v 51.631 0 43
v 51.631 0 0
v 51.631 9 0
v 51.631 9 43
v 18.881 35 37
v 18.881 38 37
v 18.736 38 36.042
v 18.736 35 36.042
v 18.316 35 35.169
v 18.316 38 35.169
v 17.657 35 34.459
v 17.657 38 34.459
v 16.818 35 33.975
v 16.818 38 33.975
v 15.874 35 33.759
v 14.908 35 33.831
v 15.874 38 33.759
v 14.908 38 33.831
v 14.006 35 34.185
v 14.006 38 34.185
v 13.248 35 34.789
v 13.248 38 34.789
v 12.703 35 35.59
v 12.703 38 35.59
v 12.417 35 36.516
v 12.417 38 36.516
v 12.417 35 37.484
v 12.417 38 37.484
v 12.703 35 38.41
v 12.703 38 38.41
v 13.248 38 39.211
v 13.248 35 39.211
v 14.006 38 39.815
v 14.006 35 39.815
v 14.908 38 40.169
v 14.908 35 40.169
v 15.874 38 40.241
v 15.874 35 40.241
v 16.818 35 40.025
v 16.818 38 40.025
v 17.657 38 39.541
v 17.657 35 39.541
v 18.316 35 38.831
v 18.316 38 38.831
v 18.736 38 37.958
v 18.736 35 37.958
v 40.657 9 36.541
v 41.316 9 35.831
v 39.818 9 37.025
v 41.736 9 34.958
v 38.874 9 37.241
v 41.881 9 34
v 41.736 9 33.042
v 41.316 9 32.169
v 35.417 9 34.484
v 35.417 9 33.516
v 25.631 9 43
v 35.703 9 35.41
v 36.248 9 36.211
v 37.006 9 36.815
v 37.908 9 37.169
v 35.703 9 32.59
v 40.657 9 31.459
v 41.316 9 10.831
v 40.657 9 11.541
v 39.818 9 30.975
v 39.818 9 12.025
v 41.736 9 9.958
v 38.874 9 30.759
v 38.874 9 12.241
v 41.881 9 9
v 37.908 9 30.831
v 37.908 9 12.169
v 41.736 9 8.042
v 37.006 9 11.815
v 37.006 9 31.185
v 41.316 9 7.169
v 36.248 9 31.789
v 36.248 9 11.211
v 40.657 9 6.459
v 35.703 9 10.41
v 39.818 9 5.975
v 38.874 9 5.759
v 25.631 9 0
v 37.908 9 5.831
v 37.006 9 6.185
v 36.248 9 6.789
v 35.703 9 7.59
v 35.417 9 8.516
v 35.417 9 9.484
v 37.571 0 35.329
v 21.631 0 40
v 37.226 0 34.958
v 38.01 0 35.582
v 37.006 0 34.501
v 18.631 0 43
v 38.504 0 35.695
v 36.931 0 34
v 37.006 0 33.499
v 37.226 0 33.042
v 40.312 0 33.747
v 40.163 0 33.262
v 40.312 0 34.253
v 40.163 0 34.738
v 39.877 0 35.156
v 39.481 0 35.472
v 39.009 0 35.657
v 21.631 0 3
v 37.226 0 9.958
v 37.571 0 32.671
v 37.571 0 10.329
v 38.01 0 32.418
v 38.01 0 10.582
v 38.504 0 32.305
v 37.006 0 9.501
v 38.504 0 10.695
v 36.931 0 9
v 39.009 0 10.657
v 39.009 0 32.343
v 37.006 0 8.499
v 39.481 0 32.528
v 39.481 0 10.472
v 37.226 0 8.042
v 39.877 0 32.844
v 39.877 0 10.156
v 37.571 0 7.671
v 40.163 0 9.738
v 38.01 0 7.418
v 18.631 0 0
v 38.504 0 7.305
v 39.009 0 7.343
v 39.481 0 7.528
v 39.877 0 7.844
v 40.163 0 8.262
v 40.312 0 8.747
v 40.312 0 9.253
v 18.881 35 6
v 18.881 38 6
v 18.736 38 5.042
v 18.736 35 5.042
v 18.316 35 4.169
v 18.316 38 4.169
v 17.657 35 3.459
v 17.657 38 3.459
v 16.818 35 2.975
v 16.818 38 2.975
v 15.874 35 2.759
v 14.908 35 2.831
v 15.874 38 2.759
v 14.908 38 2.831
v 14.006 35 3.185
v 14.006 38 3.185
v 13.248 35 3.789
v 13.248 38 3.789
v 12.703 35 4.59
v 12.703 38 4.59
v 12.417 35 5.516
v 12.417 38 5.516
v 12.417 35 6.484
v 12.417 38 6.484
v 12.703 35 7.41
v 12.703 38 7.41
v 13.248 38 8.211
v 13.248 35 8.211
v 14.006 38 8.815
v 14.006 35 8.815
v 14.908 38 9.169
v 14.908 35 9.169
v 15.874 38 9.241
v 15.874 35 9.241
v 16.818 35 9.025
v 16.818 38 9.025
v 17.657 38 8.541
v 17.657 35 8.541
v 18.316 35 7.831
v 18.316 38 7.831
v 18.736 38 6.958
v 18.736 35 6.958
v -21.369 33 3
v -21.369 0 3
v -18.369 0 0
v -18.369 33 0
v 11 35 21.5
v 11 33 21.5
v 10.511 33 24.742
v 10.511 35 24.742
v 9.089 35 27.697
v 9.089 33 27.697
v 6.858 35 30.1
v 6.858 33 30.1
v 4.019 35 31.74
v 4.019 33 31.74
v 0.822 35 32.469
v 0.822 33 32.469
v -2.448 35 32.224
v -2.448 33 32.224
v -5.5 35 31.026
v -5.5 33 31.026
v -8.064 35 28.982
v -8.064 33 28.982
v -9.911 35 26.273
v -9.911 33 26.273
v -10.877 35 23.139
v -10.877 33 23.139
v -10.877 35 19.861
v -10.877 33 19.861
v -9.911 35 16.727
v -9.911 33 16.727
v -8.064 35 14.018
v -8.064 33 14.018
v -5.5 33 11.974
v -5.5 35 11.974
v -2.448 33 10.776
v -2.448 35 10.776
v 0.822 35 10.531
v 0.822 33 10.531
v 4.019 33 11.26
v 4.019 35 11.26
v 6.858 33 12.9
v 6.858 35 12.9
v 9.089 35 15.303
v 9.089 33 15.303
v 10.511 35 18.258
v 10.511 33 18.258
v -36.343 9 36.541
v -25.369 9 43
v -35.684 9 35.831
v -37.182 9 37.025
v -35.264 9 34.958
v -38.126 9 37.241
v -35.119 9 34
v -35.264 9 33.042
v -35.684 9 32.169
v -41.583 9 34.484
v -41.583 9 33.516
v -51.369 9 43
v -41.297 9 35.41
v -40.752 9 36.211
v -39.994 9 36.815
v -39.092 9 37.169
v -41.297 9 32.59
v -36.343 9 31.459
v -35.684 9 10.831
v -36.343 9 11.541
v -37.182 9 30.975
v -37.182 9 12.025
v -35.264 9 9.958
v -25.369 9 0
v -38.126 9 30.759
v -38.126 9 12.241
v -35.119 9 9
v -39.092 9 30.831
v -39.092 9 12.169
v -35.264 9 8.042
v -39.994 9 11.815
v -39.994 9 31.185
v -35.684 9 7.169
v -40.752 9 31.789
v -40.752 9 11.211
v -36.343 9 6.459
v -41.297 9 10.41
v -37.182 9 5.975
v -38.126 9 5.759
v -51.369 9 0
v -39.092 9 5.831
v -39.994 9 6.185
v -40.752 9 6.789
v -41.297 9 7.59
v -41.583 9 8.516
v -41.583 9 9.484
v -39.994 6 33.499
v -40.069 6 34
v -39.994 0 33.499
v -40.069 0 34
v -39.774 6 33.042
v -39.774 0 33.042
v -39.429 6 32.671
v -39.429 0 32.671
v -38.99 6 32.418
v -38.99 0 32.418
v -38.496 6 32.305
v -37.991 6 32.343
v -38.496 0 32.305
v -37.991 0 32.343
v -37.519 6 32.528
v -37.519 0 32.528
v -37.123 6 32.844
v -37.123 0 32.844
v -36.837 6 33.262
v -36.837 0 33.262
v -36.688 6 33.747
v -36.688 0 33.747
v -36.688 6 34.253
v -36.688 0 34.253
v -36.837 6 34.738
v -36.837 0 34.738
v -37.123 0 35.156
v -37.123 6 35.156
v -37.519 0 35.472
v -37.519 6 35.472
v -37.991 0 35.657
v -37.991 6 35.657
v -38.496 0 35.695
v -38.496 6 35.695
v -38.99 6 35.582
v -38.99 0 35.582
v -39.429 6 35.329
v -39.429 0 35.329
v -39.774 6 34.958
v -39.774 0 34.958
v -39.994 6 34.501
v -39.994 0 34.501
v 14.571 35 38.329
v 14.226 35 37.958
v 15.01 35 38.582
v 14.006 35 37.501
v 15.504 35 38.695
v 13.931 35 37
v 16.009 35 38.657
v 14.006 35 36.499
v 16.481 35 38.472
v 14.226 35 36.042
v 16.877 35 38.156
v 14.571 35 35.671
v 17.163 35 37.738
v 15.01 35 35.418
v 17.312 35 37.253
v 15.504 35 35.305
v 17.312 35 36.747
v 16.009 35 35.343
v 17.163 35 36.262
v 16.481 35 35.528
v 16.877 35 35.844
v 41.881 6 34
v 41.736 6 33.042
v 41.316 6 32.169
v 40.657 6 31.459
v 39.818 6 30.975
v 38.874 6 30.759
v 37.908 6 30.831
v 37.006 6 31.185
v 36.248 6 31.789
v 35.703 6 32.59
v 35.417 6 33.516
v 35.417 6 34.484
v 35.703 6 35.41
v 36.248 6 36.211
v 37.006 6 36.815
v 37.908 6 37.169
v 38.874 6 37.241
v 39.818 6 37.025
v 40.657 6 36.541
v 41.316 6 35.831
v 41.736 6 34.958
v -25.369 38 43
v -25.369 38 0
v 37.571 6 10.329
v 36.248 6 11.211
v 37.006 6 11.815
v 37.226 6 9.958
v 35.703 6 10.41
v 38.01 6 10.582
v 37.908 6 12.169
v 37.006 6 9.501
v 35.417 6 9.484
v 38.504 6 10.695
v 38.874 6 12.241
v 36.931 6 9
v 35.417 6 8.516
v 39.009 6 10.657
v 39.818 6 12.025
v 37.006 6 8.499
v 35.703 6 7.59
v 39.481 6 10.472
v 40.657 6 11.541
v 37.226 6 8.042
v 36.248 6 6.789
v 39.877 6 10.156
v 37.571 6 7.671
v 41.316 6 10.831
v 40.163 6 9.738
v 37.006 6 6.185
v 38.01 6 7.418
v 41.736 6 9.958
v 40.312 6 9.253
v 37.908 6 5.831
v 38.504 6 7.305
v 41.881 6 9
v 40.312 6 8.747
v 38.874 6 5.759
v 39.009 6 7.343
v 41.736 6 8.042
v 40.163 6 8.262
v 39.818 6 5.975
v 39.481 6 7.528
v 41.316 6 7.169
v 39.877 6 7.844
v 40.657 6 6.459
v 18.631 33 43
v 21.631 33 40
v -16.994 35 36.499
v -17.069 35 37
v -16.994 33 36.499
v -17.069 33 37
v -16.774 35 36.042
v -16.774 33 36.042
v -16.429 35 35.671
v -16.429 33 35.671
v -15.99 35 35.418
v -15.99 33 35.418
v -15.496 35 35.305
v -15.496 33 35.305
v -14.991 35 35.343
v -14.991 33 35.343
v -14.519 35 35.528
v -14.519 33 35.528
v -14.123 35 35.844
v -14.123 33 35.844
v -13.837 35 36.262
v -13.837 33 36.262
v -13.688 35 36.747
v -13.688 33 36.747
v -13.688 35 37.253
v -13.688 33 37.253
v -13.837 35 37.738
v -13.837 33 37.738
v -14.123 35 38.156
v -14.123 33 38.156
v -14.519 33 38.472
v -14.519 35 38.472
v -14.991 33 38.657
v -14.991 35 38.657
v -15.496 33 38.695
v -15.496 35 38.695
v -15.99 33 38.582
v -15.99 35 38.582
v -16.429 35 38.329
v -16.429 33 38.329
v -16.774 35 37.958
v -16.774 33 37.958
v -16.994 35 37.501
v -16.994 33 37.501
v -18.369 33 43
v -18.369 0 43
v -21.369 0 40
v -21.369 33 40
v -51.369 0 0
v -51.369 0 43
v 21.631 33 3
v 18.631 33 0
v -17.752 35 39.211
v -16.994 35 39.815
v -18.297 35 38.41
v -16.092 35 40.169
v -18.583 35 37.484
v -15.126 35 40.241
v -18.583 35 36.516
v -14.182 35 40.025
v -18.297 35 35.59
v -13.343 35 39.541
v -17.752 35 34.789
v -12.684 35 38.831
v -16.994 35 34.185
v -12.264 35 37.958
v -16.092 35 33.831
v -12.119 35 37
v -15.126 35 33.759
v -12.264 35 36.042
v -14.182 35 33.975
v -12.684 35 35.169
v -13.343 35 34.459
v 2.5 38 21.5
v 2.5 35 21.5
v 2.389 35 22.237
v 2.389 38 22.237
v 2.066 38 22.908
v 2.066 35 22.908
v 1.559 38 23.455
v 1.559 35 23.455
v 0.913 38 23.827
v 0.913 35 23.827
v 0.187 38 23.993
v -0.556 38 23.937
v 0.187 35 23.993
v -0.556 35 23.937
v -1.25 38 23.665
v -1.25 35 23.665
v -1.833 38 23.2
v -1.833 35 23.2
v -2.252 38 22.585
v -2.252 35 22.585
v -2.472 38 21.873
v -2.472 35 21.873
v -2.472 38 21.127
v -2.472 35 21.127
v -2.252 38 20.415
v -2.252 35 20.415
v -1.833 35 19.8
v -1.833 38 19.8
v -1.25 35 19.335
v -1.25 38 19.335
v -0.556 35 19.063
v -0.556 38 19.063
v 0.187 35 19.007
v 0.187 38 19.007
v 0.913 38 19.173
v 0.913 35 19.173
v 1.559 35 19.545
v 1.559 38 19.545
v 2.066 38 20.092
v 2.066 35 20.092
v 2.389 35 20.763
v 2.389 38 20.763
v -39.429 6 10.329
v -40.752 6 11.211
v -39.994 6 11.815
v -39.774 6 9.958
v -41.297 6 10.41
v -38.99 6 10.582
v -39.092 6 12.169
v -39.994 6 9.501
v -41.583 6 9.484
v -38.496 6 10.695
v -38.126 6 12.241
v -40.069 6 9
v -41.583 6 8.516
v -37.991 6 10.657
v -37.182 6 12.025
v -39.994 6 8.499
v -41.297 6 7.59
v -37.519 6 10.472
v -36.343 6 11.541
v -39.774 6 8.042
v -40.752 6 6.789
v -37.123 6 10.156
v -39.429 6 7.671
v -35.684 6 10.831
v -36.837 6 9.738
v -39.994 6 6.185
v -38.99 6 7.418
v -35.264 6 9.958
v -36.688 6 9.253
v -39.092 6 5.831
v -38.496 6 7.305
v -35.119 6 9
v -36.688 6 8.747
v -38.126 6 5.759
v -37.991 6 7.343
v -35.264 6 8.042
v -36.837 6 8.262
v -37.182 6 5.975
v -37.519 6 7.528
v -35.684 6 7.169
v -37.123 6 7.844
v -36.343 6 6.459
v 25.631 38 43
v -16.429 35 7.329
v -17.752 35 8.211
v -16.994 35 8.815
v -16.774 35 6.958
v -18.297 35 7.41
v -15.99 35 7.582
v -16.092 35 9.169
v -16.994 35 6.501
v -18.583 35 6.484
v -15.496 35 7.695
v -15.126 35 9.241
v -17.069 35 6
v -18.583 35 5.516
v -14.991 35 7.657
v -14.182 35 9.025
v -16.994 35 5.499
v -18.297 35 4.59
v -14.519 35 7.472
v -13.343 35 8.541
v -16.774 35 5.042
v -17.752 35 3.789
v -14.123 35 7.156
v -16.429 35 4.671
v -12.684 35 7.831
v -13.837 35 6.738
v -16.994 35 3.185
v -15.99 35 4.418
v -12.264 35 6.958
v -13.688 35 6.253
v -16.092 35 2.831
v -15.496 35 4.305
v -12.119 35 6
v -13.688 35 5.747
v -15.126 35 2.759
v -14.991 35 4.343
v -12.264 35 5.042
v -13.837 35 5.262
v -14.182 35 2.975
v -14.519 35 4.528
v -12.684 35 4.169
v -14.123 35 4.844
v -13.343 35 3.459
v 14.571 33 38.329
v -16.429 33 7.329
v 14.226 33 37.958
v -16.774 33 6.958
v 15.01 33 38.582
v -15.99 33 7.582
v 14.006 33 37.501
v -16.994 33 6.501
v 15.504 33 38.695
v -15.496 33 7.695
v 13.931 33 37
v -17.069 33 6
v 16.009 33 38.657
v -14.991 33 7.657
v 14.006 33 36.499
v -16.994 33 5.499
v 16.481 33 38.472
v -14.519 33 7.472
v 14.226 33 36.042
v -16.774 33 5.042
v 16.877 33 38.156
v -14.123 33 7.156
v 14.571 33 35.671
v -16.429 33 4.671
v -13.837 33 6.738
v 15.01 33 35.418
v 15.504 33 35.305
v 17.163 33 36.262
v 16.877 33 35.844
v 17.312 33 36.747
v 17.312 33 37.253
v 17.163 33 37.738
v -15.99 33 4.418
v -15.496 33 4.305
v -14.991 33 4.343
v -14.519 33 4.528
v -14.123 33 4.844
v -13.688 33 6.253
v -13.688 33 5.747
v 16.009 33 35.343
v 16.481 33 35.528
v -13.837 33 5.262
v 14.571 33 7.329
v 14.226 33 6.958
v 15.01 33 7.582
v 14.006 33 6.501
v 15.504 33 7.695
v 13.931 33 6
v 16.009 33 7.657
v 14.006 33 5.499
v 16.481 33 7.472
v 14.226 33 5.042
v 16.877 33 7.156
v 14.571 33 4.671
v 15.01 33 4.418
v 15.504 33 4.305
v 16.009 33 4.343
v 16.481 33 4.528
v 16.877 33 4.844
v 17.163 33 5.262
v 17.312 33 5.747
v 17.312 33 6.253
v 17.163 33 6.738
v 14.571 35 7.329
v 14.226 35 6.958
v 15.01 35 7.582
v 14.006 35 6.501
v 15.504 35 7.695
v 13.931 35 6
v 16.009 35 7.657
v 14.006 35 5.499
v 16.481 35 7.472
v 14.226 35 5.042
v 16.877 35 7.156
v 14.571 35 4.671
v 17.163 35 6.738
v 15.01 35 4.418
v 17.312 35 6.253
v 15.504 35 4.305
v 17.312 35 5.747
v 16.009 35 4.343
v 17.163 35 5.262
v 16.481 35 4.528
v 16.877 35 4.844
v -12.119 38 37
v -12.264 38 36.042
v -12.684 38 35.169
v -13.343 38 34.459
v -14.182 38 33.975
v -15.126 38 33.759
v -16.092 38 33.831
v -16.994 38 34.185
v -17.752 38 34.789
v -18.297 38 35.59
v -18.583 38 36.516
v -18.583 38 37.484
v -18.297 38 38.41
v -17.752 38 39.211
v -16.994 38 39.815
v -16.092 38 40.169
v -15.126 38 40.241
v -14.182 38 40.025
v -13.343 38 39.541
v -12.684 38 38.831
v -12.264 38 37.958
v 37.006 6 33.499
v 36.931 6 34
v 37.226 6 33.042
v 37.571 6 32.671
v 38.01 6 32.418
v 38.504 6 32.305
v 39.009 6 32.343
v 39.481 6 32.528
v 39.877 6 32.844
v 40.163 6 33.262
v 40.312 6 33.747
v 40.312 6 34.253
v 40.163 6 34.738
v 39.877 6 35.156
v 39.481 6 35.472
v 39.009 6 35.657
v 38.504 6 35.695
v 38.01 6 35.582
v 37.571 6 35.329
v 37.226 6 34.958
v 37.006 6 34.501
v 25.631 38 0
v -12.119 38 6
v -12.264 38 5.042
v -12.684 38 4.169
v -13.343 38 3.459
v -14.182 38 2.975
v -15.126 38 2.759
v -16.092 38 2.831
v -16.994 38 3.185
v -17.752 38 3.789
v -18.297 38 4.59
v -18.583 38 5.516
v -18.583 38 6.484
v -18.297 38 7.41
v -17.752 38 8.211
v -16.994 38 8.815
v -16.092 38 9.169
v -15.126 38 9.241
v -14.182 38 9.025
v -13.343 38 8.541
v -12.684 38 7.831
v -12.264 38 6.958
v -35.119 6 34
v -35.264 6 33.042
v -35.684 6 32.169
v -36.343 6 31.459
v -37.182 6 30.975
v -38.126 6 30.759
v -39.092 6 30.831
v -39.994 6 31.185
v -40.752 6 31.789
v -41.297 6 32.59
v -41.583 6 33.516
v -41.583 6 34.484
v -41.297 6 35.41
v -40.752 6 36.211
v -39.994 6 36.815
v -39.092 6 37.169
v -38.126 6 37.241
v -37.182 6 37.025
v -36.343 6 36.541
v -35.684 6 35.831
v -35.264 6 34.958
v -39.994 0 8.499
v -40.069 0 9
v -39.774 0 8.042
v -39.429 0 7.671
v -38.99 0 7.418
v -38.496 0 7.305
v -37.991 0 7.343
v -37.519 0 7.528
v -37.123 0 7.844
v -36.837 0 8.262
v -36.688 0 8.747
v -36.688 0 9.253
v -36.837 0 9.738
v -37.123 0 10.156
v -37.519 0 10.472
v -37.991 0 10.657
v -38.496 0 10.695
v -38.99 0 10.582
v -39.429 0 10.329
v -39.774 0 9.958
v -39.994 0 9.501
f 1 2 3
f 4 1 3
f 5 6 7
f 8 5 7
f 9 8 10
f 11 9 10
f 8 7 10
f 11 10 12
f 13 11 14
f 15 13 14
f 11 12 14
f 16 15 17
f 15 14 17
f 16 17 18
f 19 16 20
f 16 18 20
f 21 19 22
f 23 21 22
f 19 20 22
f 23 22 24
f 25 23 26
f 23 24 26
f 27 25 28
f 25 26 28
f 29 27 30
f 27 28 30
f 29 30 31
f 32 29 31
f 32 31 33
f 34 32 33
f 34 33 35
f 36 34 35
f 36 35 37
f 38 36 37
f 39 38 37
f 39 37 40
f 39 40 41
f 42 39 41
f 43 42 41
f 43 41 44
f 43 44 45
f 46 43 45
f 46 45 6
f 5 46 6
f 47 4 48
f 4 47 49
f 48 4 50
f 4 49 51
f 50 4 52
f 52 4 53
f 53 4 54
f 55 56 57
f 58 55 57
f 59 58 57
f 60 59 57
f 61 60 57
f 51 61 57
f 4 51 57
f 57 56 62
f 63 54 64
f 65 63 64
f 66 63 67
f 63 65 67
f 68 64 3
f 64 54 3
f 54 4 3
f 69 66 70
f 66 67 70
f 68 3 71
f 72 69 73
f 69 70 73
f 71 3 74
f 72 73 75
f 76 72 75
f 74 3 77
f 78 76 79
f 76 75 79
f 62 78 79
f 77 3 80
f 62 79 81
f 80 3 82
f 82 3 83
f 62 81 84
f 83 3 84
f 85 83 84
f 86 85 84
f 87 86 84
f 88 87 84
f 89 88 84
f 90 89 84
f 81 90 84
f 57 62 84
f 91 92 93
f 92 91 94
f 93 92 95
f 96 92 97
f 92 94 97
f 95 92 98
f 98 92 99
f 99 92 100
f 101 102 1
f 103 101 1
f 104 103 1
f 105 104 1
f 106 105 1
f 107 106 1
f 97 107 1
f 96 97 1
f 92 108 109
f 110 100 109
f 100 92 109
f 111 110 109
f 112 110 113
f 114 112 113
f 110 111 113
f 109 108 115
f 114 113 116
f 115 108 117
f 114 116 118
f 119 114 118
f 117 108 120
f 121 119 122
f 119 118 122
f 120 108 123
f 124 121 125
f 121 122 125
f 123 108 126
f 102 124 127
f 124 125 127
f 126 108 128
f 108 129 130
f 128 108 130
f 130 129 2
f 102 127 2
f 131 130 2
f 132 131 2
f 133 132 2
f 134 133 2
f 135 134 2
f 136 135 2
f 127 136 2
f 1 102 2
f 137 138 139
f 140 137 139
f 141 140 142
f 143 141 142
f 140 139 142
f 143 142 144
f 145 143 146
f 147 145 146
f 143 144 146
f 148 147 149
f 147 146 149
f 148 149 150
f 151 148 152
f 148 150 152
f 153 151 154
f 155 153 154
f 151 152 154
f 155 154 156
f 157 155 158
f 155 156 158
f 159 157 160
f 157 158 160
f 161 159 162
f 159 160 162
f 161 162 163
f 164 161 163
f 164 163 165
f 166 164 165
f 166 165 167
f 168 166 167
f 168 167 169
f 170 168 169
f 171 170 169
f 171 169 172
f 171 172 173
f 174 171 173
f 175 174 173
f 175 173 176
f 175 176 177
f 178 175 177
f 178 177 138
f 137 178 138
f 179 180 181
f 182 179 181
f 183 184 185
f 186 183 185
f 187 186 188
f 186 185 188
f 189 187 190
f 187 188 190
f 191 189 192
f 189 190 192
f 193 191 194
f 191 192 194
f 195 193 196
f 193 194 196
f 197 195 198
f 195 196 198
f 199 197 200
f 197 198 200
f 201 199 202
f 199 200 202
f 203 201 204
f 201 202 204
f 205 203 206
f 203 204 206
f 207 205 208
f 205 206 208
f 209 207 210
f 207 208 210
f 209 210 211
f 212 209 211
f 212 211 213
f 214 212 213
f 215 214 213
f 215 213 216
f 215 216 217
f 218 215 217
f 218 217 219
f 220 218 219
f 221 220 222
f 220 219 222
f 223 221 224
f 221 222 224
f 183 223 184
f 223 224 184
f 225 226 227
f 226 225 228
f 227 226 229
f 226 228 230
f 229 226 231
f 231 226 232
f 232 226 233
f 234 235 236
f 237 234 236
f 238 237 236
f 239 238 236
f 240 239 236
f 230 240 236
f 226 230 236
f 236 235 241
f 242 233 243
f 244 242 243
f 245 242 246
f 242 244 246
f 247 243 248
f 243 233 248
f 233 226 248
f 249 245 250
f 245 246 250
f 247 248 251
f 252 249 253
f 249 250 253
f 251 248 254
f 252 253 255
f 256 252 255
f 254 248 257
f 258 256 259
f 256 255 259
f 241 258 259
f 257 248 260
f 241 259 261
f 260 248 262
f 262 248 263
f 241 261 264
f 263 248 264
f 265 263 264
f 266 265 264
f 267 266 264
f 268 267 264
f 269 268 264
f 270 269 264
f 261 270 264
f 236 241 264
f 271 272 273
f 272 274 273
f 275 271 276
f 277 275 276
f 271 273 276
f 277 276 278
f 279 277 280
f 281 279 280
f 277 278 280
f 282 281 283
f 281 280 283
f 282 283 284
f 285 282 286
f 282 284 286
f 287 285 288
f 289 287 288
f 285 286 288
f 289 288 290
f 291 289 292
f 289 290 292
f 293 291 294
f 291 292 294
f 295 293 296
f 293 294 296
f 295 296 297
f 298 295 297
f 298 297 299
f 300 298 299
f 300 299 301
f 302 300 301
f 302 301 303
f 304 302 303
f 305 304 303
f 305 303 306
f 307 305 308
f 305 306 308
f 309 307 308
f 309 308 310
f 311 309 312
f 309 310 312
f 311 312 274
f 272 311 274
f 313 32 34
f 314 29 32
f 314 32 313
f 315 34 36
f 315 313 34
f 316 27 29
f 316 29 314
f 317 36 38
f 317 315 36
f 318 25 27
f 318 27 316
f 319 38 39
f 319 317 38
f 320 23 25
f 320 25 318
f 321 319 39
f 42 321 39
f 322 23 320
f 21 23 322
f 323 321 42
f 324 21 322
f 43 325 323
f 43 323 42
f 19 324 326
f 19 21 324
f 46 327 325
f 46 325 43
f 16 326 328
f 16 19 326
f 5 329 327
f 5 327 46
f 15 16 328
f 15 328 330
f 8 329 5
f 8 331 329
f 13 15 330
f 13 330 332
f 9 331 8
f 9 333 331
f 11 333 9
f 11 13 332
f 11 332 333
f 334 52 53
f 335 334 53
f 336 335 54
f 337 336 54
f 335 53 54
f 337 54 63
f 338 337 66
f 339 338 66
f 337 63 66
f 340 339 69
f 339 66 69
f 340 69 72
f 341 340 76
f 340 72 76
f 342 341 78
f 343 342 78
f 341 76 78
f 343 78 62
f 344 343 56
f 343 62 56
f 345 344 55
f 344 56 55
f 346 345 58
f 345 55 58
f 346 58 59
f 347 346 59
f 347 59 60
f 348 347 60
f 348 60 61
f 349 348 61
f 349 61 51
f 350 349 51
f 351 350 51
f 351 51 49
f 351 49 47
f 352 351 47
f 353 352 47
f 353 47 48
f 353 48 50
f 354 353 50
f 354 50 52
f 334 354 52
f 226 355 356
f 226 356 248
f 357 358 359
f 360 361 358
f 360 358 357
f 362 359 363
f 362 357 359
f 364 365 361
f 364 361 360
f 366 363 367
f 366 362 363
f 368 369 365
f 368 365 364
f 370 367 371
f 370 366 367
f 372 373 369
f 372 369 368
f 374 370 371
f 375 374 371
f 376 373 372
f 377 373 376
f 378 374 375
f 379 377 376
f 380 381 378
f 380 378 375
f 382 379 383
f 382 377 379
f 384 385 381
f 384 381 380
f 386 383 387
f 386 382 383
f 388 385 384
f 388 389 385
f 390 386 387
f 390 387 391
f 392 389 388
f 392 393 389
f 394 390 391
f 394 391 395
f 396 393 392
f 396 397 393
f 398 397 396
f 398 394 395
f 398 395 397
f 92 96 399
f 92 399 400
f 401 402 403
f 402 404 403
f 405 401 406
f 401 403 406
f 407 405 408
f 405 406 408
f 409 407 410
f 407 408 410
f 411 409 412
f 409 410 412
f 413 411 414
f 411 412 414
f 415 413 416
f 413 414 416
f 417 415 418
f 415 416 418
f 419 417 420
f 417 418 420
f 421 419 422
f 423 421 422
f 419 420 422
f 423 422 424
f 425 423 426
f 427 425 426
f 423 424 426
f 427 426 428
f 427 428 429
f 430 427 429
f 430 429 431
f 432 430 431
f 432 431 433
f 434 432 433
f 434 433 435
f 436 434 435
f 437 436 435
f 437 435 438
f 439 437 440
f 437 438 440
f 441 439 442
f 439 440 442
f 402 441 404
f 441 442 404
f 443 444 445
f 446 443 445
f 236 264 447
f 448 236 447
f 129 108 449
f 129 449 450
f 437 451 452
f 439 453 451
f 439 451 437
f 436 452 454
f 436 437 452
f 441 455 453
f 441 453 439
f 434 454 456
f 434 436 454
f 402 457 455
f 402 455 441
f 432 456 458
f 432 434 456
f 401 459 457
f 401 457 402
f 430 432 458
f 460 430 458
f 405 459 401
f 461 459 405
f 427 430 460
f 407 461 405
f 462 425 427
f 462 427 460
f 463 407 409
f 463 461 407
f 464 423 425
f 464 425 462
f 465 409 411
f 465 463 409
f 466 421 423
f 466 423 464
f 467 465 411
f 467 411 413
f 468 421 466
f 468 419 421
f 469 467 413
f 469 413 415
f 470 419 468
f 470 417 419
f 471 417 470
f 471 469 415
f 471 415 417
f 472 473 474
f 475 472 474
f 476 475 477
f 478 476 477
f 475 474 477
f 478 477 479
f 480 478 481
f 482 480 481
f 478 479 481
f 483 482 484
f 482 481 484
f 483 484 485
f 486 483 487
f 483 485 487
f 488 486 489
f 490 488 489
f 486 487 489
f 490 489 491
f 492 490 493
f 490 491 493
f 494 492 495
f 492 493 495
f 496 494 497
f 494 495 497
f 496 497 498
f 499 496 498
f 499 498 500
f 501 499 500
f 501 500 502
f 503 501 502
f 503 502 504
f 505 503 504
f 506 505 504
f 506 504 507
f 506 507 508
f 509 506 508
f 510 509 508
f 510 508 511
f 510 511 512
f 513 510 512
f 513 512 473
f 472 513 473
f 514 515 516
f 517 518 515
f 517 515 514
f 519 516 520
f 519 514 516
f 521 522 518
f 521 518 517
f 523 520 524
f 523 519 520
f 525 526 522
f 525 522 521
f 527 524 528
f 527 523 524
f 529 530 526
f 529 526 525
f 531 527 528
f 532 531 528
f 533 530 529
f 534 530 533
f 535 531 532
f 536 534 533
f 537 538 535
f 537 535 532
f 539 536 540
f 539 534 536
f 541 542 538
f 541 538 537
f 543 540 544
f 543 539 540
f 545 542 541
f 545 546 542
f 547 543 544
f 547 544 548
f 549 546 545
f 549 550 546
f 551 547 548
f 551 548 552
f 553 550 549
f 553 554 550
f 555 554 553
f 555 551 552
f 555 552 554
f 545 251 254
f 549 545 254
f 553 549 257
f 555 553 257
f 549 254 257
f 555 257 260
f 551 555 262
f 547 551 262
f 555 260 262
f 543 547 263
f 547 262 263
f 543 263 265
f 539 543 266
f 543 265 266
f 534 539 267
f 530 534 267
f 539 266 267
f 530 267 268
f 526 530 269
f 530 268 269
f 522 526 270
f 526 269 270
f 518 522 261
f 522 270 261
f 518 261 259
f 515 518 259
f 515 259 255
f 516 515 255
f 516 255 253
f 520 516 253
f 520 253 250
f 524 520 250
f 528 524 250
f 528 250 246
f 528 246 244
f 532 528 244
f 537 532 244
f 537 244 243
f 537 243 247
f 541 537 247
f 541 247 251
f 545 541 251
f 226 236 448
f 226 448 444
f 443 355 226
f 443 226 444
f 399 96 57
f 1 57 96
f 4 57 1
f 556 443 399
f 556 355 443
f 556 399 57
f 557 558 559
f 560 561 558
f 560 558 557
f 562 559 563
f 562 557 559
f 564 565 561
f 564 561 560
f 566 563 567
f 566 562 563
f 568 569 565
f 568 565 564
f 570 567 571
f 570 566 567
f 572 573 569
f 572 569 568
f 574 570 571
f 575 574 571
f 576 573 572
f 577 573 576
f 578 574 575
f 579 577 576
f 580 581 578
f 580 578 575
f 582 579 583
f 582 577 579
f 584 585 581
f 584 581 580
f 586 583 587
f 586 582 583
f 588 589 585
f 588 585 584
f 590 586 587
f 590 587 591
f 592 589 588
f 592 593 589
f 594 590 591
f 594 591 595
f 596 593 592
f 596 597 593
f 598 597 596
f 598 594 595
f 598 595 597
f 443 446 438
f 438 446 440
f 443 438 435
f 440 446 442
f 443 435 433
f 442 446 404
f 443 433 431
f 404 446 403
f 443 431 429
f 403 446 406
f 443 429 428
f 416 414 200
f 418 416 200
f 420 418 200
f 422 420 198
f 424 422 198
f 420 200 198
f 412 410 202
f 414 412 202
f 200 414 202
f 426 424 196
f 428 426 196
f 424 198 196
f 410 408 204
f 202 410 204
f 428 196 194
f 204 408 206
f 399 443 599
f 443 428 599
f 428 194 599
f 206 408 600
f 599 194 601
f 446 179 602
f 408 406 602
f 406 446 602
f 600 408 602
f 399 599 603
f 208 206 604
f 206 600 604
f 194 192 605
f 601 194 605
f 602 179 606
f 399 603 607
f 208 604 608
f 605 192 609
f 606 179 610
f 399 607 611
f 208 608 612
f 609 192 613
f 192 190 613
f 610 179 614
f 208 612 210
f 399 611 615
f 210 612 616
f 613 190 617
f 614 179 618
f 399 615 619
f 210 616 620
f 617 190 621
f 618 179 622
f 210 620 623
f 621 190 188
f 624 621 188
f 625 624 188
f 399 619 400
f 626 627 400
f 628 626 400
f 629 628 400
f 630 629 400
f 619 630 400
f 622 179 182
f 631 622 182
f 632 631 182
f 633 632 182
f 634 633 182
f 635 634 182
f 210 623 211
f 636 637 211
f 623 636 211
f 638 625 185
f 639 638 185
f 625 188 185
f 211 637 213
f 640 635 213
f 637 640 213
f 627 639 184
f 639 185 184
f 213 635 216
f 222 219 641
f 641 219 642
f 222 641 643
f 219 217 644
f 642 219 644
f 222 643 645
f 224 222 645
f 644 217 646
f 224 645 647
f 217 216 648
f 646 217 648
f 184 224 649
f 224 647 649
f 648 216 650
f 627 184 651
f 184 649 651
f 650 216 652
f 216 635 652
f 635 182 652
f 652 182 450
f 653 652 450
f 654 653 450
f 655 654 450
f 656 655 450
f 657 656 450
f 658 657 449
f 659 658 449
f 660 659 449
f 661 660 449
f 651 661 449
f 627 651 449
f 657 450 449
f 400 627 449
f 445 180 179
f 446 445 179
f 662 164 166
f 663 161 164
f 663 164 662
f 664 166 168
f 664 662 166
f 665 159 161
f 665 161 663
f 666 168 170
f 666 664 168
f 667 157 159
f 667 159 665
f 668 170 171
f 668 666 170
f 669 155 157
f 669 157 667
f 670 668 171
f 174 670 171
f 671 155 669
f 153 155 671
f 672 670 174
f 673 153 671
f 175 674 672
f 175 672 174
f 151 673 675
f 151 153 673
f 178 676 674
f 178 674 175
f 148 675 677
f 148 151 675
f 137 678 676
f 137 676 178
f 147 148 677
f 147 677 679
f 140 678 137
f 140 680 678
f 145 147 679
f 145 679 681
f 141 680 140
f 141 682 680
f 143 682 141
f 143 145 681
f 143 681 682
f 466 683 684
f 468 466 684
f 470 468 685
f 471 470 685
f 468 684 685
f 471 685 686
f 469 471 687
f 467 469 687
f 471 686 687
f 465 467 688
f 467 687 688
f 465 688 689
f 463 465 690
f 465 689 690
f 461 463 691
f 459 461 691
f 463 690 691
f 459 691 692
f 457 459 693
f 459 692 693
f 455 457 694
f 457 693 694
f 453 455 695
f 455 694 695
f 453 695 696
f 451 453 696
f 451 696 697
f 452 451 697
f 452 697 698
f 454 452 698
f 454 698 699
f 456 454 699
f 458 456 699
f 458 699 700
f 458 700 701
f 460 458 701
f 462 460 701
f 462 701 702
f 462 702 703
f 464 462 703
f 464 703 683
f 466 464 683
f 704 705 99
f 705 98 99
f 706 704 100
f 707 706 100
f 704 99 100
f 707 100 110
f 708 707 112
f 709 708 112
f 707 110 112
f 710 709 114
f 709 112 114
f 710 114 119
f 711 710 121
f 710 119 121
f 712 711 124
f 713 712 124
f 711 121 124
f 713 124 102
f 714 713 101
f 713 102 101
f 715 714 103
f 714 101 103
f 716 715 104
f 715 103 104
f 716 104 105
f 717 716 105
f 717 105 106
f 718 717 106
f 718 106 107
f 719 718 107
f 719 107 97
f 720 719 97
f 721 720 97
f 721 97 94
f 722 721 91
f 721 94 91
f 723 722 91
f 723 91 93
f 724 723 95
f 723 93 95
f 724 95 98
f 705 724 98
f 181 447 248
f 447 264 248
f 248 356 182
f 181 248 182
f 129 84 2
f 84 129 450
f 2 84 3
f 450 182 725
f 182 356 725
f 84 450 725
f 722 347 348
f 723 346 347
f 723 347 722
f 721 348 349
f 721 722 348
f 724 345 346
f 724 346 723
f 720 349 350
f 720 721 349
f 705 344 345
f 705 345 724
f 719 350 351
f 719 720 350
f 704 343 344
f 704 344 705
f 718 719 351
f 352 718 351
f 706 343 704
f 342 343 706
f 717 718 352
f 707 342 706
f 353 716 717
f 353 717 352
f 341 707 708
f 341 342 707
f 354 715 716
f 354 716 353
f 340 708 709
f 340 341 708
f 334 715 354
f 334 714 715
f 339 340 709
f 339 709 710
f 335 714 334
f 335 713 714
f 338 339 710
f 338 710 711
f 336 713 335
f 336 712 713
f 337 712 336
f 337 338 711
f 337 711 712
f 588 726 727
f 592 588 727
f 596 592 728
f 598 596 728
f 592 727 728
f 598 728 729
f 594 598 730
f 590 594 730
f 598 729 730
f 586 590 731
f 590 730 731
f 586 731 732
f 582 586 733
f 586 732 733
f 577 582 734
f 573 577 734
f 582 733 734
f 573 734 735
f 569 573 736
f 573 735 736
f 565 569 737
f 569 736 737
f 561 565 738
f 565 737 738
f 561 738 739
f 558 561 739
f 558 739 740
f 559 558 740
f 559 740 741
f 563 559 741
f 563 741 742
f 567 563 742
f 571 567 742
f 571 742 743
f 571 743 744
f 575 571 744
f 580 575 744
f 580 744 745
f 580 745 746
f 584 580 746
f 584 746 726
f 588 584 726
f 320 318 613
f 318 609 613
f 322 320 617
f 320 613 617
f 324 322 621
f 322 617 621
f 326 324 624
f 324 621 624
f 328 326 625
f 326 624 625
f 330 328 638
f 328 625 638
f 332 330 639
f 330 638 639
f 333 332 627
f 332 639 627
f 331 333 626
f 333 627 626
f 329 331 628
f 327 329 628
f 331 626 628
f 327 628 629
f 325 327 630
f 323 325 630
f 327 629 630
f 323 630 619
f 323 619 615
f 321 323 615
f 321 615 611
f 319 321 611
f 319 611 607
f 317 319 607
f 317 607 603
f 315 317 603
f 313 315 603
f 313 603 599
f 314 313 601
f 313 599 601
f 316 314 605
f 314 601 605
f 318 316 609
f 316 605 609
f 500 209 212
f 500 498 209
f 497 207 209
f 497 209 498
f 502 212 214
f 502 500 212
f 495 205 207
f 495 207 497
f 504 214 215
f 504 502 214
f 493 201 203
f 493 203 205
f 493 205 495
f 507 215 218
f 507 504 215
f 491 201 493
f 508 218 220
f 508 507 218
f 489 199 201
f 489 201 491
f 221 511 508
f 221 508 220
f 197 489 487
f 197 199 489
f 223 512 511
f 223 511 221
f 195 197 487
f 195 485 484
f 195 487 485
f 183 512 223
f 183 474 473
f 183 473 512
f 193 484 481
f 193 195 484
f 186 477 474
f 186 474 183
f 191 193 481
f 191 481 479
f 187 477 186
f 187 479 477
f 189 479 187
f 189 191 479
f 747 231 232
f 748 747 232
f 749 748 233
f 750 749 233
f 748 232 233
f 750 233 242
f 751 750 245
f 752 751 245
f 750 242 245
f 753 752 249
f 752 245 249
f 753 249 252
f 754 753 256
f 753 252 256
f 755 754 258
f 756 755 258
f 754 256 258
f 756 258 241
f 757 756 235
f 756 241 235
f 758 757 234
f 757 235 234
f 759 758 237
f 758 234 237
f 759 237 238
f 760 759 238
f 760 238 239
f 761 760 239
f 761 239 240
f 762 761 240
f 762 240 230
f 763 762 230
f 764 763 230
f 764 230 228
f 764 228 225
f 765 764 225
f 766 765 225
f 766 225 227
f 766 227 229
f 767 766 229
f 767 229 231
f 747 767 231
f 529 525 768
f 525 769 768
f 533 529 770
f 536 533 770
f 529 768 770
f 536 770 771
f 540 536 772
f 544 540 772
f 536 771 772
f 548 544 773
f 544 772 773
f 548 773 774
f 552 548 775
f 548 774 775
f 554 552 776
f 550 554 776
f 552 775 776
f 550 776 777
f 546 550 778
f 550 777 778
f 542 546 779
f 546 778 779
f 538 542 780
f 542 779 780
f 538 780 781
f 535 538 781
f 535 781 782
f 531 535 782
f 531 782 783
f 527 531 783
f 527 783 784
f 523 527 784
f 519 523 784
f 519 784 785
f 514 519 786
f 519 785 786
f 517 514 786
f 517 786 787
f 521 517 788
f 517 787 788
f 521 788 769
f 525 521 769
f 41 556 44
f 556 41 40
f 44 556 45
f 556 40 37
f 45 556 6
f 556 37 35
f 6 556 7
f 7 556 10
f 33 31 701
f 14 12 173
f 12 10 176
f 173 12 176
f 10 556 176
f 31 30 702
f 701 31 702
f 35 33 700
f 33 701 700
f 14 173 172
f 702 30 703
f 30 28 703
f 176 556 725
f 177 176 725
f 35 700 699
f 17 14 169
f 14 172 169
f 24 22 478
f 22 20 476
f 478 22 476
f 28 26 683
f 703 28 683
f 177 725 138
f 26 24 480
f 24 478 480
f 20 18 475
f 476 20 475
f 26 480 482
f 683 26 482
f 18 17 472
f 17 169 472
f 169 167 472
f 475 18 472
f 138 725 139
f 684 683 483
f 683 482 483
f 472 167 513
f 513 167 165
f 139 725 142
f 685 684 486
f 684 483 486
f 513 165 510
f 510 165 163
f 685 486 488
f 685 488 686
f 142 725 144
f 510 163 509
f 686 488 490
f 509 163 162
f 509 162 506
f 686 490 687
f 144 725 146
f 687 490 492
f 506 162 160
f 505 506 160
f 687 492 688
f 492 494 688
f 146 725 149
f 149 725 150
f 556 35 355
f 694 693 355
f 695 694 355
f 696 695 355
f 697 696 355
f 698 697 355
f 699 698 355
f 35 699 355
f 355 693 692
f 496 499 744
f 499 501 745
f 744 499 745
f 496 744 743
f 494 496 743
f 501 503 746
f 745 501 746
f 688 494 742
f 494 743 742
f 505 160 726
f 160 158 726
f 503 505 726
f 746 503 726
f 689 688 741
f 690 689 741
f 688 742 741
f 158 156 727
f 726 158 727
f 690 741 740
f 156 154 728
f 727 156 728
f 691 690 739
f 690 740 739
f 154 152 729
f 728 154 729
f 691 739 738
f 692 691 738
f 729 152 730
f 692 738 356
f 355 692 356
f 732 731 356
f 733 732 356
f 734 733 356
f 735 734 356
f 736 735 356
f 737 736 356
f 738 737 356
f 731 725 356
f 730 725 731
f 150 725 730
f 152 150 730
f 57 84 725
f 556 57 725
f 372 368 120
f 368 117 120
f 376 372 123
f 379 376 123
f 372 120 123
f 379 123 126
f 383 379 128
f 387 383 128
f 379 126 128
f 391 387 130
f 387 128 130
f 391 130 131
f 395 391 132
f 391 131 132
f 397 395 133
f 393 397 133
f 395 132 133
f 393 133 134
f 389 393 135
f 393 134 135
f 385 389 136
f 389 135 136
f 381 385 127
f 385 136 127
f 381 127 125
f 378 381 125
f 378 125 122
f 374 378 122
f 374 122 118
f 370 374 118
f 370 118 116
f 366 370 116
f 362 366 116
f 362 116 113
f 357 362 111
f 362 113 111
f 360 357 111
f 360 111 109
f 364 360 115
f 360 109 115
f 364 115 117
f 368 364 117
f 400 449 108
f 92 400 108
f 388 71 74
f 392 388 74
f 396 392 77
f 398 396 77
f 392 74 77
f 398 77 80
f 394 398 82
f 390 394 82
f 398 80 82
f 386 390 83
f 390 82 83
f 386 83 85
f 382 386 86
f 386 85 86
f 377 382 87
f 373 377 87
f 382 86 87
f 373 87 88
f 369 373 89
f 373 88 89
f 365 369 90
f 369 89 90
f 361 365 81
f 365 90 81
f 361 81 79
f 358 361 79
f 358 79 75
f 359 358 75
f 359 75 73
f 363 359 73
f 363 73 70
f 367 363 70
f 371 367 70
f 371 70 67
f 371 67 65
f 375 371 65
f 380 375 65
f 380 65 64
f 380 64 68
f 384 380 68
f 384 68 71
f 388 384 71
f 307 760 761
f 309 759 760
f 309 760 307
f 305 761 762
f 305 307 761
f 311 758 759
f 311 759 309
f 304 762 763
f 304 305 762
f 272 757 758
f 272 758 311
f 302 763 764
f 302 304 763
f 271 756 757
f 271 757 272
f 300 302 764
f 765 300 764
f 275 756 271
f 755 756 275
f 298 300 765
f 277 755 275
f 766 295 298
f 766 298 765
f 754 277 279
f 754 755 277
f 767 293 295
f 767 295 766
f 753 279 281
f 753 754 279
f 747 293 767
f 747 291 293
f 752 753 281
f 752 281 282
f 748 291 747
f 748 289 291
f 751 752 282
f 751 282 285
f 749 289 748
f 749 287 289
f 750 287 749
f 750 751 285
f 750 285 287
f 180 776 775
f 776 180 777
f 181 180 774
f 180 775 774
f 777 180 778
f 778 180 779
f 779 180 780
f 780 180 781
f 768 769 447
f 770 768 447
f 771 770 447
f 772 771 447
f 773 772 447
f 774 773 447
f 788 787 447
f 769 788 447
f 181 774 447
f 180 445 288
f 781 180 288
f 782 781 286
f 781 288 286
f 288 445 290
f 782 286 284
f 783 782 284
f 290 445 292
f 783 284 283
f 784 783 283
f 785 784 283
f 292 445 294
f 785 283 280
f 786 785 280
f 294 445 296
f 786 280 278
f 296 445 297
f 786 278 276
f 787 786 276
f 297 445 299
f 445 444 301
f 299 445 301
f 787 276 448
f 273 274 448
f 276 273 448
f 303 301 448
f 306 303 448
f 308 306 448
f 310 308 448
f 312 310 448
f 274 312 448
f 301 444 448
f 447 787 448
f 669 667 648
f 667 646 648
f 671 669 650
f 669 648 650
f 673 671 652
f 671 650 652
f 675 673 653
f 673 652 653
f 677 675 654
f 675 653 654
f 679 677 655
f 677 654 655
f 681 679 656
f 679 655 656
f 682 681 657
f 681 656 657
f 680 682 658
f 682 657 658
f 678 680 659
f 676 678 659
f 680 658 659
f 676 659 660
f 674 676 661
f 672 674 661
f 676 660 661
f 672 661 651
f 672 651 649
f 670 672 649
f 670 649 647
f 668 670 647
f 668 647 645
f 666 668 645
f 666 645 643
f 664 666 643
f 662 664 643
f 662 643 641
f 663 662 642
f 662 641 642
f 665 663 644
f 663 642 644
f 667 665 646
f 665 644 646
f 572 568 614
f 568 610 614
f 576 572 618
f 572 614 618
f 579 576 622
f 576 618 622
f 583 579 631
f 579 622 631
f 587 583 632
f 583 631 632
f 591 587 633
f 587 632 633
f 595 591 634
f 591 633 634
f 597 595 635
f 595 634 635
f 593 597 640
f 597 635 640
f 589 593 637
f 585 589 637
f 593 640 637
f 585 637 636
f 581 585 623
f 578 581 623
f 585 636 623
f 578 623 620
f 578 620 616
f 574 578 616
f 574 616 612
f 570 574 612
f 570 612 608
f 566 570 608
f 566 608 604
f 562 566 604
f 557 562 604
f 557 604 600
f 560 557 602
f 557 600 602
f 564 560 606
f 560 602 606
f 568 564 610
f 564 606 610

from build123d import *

# Parameters (mm, degrees)
BOSS_EXTRUDE1_DEPTH            = 43
BOSS_EXTRUDE2_DEPTH            = 33
SKETCH6_R                      = 11
CUT_EXTRUDE1_DEPTH             = 2
SKETCH7_R                      = 2.5
CUT_EXTRUDE2_DEPTH             = 4
CBORE_FOR_M3_SHCS1_D           = 3.4
CBORE_FOR_M3_SHCS1_CBORE_D     = 6.5
CBORE_FOR_M3_SHCS1_CBORE_DEPTH = 3
CBORE_FOR_M3_SHCS2_D           = 3.4
CBORE_FOR_M3_SHCS2_CBORE_D     = 6.5
CBORE_FOR_M3_SHCS2_CBORE_DEPTH = 3
CBORE_FOR_M3_SHCS3_D           = 3.4
CBORE_FOR_M3_SHCS3_CBORE_D     = 6.5
CBORE_FOR_M3_SHCS3_CBORE_DEPTH = 3


with BuildPart() as part:
    # Sketch1 → Boss-Extrude1 (new body)
    with BuildSketch(Plane.XY):
        Polygon((-51.369142857, 0), (-21.369142857, 0), (-21.369142857, 33), (21.630857143, 33), (21.630857143, 0), (51.630857143, 0), (51.630857143, 9), (25.630857143, 9), (25.630857143, 38), (-25.369142857, 38), (-25.369142857, 9), (-51.369142857, 9), align=None)
    extrude(amount=BOSS_EXTRUDE1_DEPTH)

    # Sketch5 → Boss-Extrude2 (add)
    with BuildSketch(Plane.XZ.offset(-33)):
        Polygon((-21.369142857, 43), (-18.369142857, 43), (-21.369142857, 40), align=None)
        Polygon((21.630857143, 40), (21.630857143, 43), (18.630857143, 43), align=None)
        Polygon((18.630857143, 0), (21.630857143, 0), (21.630857143, 3), align=None)
        Polygon((-18.369142857, 0), (-21.369142857, 0), (-21.369142857, 3), align=None)
    extrude(amount=BOSS_EXTRUDE2_DEPTH)

    # Sketch6 → Cut-Extrude1 (cut)
    with BuildSketch(Plane.XZ.offset(-33)):
        with Locations((0, 21.5)):
            Circle(SKETCH6_R)
    extrude(amount=-CUT_EXTRUDE1_DEPTH, mode=Mode.SUBTRACT)

    # Sketch7 → Cut-Extrude2 (cut, through all)
    with BuildSketch(Plane.XZ.offset(-35)):
        with Locations((0, 21.5)):
            Circle(SKETCH7_R)
    extrude(amount=-CUT_EXTRUDE2_DEPTH, mode=Mode.SUBTRACT)

    # CBORE for M3 SHCS1 (through all)
    with Locations(Plane(origin=(0, 38, 0), x_dir=(1, 0, 0), z_dir=(0, 1, 0))):
        with Locations((-15.369142857, -6), (-15.369142857, -37), (15.630857143, -37), (15.630857143, -6)):
            CounterBoreHole(CBORE_FOR_M3_SHCS1_D / 2, CBORE_FOR_M3_SHCS1_CBORE_D / 2, CBORE_FOR_M3_SHCS1_CBORE_DEPTH)

    # CBORE for M3 SHCS2 (through all)
    with Locations(Plane(origin=(0, 9, 0), x_dir=(1, 0, 0), z_dir=(0, 1, 0))):
        with Locations((-38.369142857, -9), (-38.369142857, -34)):
            CounterBoreHole(CBORE_FOR_M3_SHCS2_D / 2, CBORE_FOR_M3_SHCS2_CBORE_D / 2, CBORE_FOR_M3_SHCS2_CBORE_DEPTH)

    # CBORE for M3 SHCS3 (through all)
    with Locations(Plane(origin=(0, 9, 0), x_dir=(1, 0, 0), z_dir=(0, 1, 0))):
        with Locations((38.630857143, -34), (38.630857143, -9)):
            CounterBoreHole(CBORE_FOR_M3_SHCS3_D / 2, CBORE_FOR_M3_SHCS3_CBORE_D / 2, CBORE_FOR_M3_SHCS3_CBORE_DEPTH)


solid = part.part
